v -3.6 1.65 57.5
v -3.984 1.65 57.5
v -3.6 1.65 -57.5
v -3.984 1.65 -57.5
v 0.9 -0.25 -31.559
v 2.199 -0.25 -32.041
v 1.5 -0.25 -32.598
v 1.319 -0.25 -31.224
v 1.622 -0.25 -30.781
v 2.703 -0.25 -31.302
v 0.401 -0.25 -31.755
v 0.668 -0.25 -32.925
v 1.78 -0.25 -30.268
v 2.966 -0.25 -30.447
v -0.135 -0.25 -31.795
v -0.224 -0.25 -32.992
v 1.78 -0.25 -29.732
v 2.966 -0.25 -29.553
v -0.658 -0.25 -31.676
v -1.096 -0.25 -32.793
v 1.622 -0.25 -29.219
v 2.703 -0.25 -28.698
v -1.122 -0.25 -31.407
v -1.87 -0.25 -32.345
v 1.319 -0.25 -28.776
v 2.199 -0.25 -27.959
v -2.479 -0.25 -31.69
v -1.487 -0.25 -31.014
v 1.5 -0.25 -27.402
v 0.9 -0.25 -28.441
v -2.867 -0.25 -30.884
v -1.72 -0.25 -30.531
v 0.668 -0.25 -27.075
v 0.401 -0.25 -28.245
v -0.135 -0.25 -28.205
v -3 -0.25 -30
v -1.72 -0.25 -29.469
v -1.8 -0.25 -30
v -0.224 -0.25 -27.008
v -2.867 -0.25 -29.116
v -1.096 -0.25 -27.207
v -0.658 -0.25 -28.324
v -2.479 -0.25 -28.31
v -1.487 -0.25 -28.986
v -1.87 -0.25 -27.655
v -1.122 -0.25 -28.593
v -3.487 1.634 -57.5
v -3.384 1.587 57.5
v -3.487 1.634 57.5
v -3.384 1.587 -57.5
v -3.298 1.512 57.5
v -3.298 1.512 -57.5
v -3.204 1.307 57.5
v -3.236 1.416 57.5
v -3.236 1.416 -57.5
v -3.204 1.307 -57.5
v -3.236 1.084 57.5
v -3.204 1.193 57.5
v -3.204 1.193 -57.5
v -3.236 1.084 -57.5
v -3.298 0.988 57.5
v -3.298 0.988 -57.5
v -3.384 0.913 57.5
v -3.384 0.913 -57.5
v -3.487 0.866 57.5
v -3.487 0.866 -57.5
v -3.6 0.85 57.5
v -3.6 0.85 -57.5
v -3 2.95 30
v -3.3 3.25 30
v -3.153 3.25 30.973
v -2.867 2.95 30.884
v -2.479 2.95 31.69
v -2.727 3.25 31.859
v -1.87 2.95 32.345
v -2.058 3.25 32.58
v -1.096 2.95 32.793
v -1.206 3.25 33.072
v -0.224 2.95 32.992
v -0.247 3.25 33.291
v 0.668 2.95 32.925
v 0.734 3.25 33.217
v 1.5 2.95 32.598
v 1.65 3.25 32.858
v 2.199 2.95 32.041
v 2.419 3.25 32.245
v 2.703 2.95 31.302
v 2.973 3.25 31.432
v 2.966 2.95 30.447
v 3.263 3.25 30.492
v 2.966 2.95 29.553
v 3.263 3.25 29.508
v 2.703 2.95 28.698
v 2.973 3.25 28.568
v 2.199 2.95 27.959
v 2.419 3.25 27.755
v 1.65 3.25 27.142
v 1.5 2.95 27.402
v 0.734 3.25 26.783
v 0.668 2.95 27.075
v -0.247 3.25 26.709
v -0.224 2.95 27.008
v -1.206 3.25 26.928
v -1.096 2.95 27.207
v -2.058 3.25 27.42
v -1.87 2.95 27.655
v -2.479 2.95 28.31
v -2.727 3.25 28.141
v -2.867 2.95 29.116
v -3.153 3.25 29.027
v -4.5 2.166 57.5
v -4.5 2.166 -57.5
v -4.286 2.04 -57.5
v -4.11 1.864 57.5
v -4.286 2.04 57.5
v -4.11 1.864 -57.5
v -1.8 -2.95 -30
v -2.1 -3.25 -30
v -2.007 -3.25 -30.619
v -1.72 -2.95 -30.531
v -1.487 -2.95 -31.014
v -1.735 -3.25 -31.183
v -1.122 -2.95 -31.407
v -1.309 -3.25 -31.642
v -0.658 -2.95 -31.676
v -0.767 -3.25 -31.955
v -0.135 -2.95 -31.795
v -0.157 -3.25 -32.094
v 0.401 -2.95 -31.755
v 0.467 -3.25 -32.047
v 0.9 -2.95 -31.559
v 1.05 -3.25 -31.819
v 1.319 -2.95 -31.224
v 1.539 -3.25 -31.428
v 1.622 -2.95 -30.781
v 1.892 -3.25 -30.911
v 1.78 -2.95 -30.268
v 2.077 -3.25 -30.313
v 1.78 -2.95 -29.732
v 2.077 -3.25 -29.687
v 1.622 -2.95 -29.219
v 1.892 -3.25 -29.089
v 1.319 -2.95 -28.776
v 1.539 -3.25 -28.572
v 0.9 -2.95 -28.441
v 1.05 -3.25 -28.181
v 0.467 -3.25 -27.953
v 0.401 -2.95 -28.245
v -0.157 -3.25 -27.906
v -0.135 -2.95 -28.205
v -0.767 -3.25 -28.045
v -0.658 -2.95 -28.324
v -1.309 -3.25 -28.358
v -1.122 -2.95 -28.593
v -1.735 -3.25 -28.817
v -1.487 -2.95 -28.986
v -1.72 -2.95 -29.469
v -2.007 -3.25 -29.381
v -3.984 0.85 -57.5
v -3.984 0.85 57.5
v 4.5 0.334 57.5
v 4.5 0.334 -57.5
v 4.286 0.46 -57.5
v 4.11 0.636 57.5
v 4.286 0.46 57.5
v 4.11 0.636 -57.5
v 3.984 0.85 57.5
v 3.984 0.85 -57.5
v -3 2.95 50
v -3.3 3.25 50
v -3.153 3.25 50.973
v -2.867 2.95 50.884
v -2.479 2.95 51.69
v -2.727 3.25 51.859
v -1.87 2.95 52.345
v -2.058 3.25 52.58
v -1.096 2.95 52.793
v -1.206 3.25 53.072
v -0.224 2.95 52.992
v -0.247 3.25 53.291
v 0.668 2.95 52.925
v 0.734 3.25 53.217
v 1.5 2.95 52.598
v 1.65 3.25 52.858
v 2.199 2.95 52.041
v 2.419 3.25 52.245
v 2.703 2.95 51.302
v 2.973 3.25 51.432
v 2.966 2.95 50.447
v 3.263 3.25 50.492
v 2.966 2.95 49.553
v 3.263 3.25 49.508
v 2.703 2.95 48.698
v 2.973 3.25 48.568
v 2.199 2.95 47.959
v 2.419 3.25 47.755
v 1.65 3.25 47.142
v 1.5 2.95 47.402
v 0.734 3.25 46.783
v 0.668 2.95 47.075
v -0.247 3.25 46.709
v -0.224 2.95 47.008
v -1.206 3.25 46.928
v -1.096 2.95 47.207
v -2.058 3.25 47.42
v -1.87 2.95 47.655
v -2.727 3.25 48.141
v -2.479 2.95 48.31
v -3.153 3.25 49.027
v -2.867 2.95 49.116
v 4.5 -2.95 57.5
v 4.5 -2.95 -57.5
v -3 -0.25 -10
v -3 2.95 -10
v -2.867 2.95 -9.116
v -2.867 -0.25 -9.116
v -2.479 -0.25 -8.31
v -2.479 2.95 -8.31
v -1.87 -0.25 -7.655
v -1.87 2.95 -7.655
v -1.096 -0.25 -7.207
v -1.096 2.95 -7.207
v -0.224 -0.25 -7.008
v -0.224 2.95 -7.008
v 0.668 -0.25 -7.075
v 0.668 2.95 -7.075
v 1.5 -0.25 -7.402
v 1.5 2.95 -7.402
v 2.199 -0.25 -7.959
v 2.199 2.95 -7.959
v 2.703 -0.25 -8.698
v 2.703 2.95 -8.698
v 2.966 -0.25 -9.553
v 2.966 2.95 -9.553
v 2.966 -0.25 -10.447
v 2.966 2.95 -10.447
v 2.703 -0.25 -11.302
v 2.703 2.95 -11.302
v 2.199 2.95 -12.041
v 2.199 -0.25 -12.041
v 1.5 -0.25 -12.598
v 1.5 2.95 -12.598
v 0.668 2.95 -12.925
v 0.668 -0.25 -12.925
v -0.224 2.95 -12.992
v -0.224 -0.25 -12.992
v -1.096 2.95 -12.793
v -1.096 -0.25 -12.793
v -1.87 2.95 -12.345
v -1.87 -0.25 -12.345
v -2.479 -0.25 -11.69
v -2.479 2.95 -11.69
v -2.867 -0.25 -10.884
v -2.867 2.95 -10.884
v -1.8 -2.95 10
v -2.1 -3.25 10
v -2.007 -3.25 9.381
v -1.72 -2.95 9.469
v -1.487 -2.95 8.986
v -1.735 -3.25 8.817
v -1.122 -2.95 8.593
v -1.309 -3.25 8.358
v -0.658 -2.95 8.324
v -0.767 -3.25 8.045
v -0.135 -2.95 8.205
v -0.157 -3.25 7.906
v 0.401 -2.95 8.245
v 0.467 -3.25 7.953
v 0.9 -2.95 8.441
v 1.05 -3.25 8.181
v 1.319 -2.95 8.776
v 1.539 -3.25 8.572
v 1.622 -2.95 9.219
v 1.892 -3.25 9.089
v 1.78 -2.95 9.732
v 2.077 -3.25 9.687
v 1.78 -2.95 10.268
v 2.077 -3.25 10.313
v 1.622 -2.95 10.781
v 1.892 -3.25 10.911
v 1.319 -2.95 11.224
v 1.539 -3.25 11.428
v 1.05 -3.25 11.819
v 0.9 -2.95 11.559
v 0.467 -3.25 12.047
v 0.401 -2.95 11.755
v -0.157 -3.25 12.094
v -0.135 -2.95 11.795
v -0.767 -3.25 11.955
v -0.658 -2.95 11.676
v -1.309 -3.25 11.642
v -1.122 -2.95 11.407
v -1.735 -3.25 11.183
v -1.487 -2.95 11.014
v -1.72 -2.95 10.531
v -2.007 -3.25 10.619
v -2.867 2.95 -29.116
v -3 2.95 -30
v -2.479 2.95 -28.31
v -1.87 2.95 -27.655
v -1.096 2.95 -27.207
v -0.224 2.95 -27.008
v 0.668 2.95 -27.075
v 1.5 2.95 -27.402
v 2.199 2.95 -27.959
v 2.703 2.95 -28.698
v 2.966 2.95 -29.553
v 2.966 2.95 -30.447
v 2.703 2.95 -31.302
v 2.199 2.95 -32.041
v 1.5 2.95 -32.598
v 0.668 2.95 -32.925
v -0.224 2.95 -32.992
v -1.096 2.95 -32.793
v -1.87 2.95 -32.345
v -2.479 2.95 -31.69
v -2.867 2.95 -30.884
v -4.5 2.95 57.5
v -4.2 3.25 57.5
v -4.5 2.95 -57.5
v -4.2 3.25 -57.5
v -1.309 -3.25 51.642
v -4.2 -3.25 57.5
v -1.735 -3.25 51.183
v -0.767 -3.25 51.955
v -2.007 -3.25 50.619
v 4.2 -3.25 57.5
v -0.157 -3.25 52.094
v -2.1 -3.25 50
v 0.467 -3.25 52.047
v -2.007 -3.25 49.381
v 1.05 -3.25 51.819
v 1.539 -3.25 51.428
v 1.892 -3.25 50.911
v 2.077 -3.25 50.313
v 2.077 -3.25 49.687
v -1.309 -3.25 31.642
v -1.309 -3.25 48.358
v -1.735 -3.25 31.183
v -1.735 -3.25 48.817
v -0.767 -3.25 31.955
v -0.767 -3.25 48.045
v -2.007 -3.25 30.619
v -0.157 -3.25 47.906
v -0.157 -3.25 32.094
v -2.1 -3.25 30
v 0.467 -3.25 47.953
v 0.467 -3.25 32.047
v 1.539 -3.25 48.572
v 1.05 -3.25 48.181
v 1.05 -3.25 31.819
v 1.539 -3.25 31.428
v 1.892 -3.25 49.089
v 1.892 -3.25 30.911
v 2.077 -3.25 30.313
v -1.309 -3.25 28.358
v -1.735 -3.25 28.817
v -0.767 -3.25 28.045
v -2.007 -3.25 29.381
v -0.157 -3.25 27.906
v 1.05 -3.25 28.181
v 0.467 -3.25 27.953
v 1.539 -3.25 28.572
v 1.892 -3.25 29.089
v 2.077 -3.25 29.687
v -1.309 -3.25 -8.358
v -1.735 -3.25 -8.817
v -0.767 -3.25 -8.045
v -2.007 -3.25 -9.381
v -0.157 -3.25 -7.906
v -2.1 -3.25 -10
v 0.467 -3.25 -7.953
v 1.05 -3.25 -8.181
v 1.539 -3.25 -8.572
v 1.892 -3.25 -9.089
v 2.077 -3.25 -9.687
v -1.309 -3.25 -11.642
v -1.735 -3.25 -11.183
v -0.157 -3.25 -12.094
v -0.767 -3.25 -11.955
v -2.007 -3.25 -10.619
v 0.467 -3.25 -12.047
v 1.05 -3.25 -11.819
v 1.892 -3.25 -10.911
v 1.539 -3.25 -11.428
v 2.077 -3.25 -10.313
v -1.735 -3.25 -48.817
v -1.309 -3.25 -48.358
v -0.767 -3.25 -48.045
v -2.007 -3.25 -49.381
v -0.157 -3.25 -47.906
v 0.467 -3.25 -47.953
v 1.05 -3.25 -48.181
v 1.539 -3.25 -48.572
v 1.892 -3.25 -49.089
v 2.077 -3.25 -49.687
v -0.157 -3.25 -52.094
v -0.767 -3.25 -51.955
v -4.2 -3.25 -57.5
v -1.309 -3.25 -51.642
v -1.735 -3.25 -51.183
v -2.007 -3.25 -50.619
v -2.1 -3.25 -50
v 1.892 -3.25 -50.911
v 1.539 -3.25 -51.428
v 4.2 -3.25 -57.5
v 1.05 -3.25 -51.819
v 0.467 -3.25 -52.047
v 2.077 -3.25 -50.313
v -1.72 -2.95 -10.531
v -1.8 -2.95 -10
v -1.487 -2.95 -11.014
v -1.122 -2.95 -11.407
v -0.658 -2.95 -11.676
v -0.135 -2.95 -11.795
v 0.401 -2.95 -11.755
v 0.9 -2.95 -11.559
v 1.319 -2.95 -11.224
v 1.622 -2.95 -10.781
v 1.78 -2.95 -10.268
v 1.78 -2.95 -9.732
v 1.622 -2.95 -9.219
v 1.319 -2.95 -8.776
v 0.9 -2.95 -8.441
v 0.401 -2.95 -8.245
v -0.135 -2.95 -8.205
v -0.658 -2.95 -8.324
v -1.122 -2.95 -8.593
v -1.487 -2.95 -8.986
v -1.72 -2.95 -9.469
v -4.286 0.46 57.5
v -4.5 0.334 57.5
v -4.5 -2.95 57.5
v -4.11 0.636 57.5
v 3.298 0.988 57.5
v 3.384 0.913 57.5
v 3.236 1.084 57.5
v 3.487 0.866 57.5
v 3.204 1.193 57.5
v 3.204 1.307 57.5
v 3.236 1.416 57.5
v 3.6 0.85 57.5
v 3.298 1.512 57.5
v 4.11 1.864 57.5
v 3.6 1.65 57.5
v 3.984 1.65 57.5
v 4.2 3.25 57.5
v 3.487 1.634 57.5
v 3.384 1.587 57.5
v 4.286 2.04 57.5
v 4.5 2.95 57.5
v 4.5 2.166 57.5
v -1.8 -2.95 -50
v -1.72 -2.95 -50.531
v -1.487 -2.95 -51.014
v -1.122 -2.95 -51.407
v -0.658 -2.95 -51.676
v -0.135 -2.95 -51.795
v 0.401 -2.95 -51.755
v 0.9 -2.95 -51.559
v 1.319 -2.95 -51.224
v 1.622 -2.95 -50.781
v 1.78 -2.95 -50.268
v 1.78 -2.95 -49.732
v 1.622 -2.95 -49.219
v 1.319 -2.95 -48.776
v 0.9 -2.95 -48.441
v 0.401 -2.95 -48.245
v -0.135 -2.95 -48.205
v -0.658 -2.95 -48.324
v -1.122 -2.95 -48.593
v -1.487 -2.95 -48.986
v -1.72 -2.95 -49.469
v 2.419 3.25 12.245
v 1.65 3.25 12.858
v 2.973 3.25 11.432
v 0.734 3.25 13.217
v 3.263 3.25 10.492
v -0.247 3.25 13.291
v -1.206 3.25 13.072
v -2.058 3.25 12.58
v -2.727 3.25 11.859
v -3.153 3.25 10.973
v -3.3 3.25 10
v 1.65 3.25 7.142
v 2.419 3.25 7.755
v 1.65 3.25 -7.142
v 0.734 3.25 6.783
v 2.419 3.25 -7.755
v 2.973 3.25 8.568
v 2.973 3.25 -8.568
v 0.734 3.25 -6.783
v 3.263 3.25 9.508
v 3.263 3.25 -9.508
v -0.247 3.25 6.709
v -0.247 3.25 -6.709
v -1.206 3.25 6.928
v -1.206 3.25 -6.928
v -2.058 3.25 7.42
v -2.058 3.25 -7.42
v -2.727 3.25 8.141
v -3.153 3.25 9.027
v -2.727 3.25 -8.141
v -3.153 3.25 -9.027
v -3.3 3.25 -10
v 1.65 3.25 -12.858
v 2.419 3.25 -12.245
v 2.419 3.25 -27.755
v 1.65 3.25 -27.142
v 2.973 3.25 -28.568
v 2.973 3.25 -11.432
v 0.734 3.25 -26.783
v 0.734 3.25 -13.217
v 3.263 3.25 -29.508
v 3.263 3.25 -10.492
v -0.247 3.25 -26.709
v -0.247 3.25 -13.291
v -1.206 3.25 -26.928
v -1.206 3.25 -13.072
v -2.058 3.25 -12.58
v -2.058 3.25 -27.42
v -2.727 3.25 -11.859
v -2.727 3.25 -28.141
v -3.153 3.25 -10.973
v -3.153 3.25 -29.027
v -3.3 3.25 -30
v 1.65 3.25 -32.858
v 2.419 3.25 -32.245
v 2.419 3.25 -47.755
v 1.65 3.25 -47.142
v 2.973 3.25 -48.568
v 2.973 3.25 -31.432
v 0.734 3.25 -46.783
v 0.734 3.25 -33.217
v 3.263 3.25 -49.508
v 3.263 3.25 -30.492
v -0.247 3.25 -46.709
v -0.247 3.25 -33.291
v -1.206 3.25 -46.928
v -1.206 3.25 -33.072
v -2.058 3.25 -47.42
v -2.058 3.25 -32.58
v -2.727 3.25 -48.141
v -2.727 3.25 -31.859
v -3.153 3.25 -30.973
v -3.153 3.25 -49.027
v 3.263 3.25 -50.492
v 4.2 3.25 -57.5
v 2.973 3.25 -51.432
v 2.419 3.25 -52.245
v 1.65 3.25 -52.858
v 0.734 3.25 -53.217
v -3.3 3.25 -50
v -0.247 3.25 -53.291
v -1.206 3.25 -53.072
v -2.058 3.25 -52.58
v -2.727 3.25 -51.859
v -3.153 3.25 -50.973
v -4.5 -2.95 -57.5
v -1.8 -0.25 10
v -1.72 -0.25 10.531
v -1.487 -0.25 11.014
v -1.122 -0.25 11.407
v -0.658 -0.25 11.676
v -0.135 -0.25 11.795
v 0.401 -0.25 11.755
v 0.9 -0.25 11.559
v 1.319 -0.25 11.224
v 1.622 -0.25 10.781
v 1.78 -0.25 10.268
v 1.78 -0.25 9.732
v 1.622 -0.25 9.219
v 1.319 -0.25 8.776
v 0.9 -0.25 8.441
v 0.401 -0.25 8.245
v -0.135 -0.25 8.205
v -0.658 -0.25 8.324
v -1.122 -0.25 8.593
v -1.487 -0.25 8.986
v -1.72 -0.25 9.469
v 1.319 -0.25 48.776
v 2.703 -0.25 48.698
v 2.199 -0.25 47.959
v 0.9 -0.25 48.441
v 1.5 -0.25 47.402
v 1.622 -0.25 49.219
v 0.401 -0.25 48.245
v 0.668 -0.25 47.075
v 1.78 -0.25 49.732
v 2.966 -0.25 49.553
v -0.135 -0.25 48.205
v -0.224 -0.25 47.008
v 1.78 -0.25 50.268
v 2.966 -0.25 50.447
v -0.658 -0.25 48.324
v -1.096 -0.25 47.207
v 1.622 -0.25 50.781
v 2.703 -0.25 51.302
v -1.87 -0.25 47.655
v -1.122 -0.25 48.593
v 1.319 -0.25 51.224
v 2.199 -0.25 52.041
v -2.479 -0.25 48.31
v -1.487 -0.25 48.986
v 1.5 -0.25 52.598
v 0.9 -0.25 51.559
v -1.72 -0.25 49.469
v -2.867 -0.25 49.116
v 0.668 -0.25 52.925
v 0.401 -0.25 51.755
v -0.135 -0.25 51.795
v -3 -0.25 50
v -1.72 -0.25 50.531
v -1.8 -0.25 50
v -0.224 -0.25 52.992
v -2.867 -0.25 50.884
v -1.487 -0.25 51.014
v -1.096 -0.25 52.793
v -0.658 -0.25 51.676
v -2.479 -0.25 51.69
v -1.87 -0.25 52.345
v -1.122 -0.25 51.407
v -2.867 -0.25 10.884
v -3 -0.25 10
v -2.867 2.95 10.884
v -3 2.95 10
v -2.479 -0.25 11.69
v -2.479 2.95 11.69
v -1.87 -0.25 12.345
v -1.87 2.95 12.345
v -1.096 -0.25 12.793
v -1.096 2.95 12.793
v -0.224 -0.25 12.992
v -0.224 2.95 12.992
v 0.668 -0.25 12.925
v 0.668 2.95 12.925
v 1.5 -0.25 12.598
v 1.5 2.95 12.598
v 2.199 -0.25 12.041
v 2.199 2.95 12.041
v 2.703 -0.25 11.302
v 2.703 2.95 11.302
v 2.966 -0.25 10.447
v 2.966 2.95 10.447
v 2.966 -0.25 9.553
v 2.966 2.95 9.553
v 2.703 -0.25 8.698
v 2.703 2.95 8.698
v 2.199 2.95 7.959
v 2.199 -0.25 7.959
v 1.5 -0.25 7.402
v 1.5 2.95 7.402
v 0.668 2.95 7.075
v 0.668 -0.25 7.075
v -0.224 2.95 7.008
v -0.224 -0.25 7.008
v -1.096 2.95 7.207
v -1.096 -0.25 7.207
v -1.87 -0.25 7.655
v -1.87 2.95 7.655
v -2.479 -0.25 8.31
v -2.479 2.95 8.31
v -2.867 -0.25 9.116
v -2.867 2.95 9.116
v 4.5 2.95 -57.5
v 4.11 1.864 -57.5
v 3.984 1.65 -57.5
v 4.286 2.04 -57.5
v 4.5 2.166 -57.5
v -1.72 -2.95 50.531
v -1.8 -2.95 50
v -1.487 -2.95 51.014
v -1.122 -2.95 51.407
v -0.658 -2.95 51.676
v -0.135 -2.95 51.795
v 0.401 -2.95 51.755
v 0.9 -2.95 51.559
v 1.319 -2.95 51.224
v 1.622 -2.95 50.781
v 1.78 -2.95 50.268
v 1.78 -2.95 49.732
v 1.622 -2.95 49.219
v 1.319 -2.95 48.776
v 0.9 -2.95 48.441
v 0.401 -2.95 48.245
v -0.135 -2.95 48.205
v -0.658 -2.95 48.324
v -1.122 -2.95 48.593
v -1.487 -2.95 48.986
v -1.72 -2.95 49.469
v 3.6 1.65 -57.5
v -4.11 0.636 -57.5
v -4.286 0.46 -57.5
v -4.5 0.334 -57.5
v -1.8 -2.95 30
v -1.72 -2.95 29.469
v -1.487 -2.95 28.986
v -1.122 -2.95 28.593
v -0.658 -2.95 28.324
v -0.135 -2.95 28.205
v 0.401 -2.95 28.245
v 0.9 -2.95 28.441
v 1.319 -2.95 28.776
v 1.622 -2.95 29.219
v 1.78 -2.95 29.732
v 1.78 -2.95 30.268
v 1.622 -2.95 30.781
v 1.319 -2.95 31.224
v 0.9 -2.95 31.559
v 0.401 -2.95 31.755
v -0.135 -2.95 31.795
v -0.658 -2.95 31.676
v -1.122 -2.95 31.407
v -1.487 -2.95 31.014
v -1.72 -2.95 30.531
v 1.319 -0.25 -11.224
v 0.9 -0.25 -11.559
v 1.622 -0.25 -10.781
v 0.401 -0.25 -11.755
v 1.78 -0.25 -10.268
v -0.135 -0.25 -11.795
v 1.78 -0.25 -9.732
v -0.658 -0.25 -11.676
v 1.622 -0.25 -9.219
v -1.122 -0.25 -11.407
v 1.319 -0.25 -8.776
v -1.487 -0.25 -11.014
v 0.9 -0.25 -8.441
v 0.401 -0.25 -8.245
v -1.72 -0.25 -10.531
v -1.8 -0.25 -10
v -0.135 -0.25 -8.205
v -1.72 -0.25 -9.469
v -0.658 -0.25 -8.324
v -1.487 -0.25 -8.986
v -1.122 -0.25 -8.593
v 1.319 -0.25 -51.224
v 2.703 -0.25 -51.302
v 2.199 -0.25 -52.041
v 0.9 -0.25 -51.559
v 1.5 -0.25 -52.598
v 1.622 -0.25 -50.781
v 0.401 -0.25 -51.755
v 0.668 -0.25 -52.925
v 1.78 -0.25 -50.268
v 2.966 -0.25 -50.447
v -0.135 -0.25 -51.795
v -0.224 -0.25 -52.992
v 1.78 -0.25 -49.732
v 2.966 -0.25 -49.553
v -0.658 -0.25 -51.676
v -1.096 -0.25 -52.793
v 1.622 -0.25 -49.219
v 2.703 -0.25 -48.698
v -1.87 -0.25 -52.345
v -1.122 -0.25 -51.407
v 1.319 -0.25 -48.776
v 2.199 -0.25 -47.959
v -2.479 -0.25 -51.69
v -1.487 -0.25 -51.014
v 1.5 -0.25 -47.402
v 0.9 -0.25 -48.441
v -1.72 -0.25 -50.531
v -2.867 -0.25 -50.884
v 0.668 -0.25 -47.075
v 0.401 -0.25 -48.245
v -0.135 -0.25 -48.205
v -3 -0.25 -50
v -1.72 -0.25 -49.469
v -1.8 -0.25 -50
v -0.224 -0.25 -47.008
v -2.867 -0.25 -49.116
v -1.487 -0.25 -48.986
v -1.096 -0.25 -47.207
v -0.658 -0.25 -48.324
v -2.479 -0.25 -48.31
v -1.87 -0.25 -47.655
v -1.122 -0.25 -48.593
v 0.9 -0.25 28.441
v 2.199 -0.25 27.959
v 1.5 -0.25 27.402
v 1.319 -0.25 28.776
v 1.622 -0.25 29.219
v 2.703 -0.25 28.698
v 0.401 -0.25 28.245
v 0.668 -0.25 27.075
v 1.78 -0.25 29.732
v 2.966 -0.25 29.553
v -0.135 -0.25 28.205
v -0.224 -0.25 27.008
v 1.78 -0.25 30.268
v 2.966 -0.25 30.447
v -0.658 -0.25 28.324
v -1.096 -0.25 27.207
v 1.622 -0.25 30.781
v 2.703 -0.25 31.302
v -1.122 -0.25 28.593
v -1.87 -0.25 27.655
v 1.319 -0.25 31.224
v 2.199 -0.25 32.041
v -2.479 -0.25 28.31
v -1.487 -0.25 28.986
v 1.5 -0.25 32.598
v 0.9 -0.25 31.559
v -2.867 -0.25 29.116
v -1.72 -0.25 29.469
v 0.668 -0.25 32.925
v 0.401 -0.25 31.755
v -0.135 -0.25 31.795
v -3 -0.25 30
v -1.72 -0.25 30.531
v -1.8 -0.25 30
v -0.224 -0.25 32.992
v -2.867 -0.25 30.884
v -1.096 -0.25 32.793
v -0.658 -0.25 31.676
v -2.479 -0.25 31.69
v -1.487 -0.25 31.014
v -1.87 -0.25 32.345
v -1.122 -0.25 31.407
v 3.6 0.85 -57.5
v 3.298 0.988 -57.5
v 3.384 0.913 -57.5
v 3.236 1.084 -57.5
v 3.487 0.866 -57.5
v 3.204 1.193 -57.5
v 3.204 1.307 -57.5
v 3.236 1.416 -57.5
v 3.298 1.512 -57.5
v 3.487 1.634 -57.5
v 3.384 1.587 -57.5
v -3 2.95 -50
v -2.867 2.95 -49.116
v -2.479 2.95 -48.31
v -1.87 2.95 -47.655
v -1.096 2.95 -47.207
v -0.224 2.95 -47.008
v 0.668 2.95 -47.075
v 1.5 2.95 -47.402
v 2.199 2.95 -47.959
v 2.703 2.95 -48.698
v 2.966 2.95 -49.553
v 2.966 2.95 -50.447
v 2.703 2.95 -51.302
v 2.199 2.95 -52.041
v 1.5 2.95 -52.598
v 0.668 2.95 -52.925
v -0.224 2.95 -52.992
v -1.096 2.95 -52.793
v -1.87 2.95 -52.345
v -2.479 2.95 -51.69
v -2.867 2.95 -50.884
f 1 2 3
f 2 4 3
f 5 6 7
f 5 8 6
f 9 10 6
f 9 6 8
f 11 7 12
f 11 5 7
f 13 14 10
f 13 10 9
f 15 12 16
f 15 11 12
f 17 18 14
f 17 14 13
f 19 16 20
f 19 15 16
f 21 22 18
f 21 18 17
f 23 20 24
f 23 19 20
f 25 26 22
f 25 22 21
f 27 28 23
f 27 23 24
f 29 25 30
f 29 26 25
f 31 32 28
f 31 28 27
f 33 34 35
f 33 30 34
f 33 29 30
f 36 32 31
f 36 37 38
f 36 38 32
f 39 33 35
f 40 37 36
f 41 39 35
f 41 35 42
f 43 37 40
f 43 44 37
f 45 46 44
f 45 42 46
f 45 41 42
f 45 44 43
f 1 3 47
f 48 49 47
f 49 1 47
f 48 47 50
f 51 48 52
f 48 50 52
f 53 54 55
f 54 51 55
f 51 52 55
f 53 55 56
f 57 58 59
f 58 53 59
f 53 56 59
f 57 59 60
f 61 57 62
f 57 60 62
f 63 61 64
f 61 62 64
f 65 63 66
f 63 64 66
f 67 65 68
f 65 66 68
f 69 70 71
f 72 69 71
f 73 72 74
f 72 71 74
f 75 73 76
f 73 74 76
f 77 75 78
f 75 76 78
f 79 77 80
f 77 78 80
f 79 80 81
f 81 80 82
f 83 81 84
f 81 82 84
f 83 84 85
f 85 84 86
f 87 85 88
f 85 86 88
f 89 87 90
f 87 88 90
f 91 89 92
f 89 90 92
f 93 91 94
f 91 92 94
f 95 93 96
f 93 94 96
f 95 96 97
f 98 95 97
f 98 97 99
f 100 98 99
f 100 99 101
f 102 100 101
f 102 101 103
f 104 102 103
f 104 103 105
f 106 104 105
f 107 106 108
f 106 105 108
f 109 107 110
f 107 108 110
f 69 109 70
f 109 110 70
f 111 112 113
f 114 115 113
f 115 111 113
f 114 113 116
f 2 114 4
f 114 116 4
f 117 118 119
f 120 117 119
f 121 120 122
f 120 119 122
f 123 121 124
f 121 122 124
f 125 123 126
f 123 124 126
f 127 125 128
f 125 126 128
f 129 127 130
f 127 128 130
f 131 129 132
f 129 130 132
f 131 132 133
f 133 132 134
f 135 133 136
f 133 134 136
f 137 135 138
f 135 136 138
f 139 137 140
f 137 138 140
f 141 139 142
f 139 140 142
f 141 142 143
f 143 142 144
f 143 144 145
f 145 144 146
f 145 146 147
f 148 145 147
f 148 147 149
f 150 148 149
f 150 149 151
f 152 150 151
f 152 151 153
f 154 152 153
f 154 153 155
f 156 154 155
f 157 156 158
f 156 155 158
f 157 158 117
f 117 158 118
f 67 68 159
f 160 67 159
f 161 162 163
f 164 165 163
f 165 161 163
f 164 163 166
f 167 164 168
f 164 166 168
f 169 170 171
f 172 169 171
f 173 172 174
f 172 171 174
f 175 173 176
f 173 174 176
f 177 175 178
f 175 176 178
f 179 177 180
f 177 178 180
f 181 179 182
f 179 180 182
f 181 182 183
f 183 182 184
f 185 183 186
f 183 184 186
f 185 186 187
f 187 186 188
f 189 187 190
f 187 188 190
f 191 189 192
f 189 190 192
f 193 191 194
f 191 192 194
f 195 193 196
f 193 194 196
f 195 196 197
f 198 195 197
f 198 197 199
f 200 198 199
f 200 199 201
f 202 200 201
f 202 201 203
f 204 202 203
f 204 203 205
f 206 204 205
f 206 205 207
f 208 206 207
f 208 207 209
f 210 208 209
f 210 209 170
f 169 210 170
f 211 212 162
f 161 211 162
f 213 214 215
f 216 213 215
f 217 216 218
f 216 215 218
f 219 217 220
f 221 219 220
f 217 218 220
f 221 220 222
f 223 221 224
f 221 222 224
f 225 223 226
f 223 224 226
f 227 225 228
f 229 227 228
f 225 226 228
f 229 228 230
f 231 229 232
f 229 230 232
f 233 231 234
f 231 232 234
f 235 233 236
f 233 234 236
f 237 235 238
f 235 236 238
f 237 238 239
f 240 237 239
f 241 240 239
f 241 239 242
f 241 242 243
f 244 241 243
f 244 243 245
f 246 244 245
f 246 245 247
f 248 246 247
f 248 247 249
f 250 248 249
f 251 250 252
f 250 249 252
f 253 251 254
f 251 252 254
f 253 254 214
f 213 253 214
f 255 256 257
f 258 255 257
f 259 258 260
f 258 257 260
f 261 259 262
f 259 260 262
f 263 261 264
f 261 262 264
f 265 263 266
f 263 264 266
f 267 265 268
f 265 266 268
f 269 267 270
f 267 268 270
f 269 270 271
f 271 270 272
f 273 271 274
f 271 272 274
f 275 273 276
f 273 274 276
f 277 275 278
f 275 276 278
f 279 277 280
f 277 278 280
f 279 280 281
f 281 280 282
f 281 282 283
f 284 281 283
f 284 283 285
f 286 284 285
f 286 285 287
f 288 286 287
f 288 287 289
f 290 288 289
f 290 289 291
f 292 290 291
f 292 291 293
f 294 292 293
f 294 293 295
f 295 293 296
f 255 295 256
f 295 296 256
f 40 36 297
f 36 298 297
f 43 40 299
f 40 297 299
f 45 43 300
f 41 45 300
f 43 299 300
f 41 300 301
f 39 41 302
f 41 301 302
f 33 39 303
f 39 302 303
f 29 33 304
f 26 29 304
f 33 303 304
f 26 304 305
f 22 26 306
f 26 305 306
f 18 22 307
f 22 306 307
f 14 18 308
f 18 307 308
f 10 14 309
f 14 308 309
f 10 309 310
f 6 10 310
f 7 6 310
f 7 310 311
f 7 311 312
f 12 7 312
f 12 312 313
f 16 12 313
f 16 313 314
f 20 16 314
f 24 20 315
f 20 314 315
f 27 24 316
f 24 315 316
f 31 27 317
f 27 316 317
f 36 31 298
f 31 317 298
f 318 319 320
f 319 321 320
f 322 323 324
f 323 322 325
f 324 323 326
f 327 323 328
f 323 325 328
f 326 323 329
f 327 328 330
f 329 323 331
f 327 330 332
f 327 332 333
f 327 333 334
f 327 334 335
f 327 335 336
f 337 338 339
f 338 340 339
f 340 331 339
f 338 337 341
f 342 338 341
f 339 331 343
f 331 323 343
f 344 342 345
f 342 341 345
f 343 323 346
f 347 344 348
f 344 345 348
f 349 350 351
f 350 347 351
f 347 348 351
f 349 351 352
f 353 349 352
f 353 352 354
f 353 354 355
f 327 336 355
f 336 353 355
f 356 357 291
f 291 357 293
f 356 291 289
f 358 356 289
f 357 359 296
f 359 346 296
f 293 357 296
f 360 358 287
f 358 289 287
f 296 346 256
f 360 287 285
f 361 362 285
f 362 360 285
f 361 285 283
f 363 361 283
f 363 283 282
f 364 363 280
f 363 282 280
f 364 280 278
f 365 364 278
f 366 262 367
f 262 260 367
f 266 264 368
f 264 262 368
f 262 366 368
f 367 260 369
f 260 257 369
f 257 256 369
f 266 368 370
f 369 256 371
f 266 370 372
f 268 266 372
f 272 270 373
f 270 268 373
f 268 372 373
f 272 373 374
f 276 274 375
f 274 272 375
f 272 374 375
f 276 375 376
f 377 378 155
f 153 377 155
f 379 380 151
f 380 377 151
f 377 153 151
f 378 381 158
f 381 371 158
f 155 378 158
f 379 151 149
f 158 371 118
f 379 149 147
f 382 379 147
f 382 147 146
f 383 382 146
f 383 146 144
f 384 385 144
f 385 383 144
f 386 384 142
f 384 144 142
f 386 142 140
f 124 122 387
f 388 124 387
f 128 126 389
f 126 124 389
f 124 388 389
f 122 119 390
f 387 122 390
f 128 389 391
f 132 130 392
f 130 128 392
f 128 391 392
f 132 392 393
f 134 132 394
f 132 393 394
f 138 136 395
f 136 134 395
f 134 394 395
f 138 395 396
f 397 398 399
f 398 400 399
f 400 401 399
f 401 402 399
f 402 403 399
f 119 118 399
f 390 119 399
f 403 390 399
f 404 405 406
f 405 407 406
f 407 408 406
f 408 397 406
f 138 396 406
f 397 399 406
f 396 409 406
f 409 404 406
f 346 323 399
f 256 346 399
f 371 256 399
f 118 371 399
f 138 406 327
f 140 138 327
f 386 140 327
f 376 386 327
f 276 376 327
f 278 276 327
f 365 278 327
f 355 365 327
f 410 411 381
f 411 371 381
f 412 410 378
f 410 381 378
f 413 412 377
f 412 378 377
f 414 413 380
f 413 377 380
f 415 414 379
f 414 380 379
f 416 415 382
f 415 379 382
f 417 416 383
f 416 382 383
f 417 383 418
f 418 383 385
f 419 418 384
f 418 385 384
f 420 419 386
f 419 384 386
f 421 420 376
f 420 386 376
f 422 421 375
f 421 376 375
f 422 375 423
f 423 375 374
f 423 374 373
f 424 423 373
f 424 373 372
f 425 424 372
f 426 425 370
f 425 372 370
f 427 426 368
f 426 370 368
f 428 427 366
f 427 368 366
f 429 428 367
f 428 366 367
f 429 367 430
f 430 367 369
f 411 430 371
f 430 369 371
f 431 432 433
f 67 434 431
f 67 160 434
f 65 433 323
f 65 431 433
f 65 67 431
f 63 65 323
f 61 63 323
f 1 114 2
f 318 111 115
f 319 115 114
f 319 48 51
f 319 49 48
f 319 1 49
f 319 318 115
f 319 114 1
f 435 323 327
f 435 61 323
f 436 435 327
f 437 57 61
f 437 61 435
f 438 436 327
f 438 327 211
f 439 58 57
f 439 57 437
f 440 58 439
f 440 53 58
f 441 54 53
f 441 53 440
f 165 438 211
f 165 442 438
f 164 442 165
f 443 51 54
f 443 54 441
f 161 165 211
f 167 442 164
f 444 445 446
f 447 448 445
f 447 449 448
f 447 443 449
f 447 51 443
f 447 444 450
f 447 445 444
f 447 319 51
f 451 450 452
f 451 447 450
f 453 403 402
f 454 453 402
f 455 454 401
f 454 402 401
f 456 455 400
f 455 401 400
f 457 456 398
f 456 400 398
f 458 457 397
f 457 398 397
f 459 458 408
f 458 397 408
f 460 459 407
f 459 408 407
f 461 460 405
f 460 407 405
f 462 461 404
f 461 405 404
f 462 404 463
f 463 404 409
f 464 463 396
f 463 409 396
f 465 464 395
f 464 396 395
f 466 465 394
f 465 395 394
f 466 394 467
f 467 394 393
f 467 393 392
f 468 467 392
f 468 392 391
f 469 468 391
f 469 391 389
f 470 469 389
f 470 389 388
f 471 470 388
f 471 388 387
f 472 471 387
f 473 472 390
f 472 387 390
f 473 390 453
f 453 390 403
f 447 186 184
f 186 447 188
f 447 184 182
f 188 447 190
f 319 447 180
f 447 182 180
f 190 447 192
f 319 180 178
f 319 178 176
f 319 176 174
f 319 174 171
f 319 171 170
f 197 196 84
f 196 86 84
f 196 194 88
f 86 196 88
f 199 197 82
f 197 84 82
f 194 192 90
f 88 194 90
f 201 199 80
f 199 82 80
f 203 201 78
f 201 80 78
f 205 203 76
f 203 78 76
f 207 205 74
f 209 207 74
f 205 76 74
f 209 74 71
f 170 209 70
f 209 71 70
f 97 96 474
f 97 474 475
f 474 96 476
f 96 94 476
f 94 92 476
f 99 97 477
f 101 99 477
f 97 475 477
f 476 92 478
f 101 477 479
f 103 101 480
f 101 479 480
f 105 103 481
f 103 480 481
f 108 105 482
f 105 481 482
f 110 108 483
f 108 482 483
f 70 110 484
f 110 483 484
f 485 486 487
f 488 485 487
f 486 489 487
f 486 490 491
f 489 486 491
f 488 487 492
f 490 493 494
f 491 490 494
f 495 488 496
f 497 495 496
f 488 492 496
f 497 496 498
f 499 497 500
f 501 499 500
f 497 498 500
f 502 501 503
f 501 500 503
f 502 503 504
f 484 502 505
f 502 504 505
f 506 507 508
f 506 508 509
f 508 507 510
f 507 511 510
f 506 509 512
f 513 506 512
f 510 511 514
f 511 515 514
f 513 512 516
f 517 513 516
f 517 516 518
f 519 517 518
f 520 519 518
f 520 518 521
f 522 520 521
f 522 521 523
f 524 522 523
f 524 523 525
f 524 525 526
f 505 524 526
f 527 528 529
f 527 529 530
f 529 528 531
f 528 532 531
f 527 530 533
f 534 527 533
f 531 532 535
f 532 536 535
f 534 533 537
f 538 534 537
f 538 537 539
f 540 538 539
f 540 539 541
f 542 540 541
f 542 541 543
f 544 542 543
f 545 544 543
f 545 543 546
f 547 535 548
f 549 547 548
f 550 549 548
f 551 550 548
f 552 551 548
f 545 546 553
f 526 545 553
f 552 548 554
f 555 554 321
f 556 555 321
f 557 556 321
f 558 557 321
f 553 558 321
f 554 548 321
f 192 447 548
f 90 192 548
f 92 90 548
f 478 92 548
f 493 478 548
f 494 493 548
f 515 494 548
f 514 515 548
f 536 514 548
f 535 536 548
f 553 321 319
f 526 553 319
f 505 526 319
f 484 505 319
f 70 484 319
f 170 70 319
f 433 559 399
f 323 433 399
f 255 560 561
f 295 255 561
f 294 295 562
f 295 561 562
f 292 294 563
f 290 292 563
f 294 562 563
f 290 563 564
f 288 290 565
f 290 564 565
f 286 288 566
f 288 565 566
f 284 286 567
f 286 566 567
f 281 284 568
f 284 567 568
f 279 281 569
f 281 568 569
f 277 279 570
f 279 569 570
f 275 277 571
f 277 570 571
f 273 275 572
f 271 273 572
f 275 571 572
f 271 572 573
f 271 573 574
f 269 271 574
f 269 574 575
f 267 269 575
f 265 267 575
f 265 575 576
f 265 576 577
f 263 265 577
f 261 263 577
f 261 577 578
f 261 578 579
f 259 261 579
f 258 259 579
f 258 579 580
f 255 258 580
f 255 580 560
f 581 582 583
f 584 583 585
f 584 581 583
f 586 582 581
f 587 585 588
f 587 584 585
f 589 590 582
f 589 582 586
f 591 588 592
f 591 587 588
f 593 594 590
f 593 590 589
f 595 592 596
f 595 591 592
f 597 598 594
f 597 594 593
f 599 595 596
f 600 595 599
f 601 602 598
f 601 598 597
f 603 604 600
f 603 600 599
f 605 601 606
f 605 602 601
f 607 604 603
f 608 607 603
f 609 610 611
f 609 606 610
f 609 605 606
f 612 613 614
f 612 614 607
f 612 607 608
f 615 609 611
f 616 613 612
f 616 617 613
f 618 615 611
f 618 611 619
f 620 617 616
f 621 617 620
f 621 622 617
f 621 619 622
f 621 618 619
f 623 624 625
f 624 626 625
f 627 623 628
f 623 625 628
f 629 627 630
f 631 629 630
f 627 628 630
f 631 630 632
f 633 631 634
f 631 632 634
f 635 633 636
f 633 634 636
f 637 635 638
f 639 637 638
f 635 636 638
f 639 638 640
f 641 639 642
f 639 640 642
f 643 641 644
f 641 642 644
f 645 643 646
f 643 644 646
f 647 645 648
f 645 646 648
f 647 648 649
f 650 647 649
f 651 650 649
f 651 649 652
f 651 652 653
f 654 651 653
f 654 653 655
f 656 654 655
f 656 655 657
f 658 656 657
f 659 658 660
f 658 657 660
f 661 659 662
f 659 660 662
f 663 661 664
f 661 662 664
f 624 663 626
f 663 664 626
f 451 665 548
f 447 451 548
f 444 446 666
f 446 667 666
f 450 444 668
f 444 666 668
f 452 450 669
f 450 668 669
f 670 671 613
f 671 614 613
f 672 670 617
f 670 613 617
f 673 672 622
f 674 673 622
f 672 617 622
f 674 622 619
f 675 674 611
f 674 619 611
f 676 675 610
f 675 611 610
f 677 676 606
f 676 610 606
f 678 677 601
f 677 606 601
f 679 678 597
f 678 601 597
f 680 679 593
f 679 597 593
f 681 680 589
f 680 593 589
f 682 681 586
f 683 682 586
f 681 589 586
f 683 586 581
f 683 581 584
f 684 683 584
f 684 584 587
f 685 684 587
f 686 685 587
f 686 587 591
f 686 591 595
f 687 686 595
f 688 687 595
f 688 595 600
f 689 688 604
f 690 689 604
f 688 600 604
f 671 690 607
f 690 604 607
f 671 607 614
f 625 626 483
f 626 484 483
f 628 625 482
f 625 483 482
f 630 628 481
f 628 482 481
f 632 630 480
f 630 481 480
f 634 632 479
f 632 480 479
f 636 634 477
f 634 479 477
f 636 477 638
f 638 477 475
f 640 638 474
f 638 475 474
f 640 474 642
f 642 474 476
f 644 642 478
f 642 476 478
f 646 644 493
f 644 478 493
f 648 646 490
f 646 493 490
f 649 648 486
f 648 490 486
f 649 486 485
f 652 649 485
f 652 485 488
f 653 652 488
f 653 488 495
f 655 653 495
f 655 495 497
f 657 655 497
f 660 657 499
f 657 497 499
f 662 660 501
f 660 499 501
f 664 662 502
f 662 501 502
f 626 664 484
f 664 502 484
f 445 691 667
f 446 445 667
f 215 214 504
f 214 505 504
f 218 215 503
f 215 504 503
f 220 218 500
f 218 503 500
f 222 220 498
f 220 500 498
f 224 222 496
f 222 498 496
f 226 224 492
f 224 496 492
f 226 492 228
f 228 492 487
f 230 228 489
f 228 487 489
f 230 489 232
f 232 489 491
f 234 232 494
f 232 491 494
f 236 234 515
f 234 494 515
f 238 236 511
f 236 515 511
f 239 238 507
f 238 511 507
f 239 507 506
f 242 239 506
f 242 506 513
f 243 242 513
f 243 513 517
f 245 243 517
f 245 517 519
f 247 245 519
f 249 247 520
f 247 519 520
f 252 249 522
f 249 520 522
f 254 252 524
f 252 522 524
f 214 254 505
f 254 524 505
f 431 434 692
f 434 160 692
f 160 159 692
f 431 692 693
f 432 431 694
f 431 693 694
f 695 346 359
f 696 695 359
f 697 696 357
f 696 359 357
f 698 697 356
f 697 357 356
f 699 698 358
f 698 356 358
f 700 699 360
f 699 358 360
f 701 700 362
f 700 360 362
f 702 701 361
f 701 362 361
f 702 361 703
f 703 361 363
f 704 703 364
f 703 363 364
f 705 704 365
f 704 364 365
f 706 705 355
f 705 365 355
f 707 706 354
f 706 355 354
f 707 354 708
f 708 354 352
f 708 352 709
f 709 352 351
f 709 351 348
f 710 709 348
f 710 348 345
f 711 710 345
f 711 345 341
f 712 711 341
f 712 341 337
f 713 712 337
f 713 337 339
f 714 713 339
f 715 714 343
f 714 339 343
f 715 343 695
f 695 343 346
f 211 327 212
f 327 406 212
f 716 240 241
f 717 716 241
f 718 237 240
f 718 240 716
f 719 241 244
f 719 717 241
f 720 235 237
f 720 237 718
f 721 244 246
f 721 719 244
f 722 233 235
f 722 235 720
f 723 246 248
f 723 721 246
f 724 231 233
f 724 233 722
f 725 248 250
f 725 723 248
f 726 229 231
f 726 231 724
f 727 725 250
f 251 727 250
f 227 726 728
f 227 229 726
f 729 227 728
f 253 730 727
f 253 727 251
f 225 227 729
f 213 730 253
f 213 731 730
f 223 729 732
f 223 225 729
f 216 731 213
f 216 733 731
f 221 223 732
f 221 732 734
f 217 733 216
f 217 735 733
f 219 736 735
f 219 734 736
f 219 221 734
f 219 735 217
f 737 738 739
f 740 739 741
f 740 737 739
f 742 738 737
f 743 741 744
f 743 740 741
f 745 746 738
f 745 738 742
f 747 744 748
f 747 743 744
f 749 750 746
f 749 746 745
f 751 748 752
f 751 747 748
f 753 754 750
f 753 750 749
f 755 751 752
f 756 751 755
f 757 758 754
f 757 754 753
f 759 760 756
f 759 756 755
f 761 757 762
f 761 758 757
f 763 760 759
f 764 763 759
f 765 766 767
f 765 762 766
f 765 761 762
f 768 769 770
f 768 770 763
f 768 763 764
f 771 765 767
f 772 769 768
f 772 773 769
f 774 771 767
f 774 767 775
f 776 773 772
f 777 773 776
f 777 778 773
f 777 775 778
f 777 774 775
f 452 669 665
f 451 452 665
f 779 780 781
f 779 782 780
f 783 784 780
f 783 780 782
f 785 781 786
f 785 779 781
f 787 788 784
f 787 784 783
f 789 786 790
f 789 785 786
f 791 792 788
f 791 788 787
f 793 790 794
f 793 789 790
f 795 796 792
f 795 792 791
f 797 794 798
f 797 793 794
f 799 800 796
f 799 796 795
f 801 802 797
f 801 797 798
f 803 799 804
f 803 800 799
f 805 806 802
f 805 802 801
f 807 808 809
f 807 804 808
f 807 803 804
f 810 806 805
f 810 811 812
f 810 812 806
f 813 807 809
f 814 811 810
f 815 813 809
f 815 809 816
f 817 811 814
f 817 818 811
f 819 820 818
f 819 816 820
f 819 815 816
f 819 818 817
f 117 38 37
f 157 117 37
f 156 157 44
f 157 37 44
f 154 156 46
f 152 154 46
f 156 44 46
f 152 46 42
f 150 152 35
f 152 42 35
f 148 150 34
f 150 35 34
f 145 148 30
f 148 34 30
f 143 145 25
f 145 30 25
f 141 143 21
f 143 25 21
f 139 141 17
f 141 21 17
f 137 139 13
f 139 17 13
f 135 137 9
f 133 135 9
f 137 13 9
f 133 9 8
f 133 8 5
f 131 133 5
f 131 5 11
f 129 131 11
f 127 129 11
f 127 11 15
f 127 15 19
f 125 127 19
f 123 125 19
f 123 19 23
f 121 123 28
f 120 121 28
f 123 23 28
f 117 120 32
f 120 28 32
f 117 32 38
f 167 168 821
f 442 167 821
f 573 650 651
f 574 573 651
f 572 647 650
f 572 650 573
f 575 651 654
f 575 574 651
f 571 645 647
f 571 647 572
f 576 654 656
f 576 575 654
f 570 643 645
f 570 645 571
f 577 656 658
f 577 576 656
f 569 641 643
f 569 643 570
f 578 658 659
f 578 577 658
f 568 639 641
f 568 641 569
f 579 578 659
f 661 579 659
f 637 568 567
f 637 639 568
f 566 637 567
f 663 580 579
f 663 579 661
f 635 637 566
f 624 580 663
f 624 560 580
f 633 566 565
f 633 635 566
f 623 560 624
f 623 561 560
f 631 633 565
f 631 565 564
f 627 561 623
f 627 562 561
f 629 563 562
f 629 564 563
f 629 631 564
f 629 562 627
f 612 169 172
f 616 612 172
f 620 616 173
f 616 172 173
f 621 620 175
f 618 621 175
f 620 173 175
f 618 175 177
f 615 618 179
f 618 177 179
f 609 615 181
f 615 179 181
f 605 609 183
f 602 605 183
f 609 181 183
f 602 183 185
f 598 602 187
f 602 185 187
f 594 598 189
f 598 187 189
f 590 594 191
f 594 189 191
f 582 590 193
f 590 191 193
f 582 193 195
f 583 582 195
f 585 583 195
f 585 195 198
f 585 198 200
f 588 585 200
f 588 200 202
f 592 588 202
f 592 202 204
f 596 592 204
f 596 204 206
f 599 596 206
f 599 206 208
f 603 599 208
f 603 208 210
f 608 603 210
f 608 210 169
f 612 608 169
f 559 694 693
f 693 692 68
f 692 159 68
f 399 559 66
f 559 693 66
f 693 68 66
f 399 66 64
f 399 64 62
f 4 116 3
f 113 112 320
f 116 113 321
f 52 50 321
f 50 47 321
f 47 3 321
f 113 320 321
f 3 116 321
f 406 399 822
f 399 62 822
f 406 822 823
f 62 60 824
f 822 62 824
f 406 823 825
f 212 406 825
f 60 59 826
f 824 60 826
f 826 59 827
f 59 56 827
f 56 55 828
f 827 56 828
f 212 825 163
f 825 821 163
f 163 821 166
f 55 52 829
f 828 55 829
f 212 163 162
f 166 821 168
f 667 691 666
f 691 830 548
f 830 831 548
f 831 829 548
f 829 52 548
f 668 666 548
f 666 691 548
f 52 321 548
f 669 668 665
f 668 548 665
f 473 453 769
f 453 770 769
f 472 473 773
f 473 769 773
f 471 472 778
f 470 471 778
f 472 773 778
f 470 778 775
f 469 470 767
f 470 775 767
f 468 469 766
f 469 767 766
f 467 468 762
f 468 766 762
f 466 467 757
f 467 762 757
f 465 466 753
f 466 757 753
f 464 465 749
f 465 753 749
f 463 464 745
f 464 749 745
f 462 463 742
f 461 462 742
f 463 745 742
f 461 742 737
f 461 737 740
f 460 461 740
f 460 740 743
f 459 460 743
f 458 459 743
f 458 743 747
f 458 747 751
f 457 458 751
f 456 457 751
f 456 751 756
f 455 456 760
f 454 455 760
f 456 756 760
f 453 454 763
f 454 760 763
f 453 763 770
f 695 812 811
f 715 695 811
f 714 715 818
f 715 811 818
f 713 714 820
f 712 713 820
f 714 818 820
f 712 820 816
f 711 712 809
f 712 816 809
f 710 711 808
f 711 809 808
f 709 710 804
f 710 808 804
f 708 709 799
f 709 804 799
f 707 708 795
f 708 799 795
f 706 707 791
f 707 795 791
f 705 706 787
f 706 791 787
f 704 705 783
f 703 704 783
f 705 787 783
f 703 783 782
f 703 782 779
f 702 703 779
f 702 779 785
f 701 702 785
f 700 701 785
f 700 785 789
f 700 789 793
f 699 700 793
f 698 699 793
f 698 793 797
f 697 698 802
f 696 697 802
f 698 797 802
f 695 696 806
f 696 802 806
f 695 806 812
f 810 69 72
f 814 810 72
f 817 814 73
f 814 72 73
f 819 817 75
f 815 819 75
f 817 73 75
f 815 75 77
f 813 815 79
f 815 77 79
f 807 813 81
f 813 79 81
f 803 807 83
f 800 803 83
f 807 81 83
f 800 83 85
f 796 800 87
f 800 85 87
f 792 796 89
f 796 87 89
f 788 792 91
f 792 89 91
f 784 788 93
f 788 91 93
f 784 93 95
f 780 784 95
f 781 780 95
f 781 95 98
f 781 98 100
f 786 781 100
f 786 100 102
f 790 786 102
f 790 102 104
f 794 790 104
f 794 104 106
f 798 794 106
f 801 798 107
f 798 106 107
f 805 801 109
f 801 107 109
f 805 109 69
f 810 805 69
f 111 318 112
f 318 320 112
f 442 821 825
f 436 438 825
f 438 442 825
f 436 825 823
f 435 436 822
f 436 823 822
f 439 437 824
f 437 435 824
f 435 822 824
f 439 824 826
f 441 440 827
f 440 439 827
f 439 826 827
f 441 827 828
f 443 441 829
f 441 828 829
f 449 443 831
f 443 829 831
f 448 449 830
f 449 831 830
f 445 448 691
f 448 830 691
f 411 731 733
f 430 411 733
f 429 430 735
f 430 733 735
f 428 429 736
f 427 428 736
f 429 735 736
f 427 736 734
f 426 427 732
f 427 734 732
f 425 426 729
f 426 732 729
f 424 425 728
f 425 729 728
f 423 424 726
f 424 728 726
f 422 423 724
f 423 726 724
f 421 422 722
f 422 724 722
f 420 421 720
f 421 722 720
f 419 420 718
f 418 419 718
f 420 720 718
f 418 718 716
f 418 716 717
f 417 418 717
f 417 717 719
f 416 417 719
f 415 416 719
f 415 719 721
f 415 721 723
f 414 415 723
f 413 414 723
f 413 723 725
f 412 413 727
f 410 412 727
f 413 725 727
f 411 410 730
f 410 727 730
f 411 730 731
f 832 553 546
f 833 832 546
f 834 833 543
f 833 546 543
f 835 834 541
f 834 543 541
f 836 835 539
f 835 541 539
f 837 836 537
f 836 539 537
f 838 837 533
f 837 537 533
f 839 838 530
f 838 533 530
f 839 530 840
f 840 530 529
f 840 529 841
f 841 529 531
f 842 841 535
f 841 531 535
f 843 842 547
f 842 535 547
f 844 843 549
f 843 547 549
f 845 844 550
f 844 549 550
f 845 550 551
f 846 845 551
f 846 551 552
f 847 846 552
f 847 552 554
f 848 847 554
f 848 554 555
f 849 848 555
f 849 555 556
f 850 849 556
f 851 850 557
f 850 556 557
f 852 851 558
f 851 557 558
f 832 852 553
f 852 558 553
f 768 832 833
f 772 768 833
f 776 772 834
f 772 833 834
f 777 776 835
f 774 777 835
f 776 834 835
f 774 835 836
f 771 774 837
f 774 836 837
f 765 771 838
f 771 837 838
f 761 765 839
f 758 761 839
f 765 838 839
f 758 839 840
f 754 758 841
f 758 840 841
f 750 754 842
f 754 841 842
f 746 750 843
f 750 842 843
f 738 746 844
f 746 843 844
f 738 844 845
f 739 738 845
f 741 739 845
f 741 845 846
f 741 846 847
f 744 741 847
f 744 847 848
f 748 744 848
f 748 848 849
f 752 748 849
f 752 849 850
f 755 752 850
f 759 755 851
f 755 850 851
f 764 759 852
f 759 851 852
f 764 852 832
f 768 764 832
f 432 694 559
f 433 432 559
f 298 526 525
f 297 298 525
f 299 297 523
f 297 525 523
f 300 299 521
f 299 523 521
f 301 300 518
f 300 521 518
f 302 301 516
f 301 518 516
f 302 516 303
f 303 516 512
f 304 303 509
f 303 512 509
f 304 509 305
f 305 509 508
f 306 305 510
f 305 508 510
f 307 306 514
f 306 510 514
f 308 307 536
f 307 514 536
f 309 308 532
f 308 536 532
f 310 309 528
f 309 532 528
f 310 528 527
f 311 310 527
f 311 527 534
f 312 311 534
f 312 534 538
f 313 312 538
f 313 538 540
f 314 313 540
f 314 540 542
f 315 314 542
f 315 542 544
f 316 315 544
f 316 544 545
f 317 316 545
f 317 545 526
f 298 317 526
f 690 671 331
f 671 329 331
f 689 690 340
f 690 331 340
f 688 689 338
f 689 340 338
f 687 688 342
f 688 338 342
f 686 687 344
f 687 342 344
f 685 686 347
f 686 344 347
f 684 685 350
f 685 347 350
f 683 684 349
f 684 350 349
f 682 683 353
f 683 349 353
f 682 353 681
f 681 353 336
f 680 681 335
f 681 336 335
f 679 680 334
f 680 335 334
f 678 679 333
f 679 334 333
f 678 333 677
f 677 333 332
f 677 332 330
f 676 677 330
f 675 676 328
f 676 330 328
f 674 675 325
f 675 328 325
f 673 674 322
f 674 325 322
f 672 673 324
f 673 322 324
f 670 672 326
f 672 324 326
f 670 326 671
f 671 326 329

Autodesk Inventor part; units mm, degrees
sketch "_____1" plane through (0, 0, 0) normal (0, 0, 1) x (1, 0, 0)
  line L0 (-4.5, 2.95) -> (-4.5, 2.1665)
  arc A0 (-3.9835, 1.65) -> (-4.5, 2.1665) centre (-4.9, 1.25) ccw
  line L1 (-3.9835, 1.65) -> (-3.6, 1.65)
  arc A1 (-3.6, 0.85) -> (-3.6, 1.65) centre (-3.6, 1.25) ccw
  line L2 (-3.6, 0.85) -> (-3.9835, 0.85)
  arc A2 (-4.5, 0.3335) -> (-3.9835, 0.85) centre (-4.9, 1.25) ccw
  line L3 (-4.5, 0.3335) -> (-4.5, -2.95)
  line L4 (-4.5, -2.95) -> (-4.2, -3.25)
  line L5 (-4.2, -3.25) -> (4.2, -3.25)
  line L6 (4.2, -3.25) -> (4.5, -2.95)
  line L7 (4.5, -2.95) -> (4.5, 0.3335)
  arc A3 (3.9835, 0.85) -> (4.5, 0.3335) centre (4.9, 1.25) ccw
  line L8 (3.9835, 0.85) -> (3.6, 0.85)
  arc A4 (3.6, 1.65) -> (3.6, 0.85) centre (3.6, 1.25) ccw
  line L9 (3.6, 1.65) -> (3.9835, 1.65)
  arc A5 (4.5, 2.1665) -> (3.9835, 1.65) centre (4.9, 1.25) ccw
  line L10 (4.5, 2.1665) -> (4.5, 2.95)
  line L11 (4.5, 2.95) -> (4.2, 3.25)
  line L12 (4.2, 3.25) -> (-4.2, 3.25)
  line L13 (-4.2, 3.25) -> (-4.5, 2.95)
extrude "Extrusion1" add sketch "_____1" along normal mid plane 115
sketch "_____5" plane through (0, 0, 50) normal (0, 0, 1) x (1, 0, 0)
  line L0 (0, 3.25) -> (0, -3.25)
  line L1 (0, -3.25) -> (-2.1, -3.25)
  line L2 (-2.1, -3.25) -> (-1.8, -2.95)
  line L3 (-1.8, -2.95) -> (-1.8, -0.25)
  line L4 (-1.8, -0.25) -> (-3, -0.25)
  line L5 (-3, -0.25) -> (-3, 2.95)
  line L6 (-3, 2.95) -> (-3.3, 3.25)
  line L7 (-3.3, 3.25) -> (0, 3.25)
  line L8 (0, 3.25) -> (0, -3.25)
revolve "Revolution1" cut sketch "_____5" angle 360 about axis through (0, 3.25, 50) along (0, 1, 0)
pattern_linear "Rectangular Pattern1" count 6 spacing 20 along (0, 0, -1) of "Revolution1"
ref_plane "to_block1_XY" through (0, -3.25, 0) normal (0, 0, 1) x (1, 0, 0)
ref_plane "to_block1_YZ" through (0, -3.25, 0) normal (1, 0, 0) x (0, 1, 0)
ref_plane "to_block1_ZX" through (0, -3.25, 0) normal (0, 1, 0) x (0, 0, 1)
properties part number "C-MLG9-115_r"
